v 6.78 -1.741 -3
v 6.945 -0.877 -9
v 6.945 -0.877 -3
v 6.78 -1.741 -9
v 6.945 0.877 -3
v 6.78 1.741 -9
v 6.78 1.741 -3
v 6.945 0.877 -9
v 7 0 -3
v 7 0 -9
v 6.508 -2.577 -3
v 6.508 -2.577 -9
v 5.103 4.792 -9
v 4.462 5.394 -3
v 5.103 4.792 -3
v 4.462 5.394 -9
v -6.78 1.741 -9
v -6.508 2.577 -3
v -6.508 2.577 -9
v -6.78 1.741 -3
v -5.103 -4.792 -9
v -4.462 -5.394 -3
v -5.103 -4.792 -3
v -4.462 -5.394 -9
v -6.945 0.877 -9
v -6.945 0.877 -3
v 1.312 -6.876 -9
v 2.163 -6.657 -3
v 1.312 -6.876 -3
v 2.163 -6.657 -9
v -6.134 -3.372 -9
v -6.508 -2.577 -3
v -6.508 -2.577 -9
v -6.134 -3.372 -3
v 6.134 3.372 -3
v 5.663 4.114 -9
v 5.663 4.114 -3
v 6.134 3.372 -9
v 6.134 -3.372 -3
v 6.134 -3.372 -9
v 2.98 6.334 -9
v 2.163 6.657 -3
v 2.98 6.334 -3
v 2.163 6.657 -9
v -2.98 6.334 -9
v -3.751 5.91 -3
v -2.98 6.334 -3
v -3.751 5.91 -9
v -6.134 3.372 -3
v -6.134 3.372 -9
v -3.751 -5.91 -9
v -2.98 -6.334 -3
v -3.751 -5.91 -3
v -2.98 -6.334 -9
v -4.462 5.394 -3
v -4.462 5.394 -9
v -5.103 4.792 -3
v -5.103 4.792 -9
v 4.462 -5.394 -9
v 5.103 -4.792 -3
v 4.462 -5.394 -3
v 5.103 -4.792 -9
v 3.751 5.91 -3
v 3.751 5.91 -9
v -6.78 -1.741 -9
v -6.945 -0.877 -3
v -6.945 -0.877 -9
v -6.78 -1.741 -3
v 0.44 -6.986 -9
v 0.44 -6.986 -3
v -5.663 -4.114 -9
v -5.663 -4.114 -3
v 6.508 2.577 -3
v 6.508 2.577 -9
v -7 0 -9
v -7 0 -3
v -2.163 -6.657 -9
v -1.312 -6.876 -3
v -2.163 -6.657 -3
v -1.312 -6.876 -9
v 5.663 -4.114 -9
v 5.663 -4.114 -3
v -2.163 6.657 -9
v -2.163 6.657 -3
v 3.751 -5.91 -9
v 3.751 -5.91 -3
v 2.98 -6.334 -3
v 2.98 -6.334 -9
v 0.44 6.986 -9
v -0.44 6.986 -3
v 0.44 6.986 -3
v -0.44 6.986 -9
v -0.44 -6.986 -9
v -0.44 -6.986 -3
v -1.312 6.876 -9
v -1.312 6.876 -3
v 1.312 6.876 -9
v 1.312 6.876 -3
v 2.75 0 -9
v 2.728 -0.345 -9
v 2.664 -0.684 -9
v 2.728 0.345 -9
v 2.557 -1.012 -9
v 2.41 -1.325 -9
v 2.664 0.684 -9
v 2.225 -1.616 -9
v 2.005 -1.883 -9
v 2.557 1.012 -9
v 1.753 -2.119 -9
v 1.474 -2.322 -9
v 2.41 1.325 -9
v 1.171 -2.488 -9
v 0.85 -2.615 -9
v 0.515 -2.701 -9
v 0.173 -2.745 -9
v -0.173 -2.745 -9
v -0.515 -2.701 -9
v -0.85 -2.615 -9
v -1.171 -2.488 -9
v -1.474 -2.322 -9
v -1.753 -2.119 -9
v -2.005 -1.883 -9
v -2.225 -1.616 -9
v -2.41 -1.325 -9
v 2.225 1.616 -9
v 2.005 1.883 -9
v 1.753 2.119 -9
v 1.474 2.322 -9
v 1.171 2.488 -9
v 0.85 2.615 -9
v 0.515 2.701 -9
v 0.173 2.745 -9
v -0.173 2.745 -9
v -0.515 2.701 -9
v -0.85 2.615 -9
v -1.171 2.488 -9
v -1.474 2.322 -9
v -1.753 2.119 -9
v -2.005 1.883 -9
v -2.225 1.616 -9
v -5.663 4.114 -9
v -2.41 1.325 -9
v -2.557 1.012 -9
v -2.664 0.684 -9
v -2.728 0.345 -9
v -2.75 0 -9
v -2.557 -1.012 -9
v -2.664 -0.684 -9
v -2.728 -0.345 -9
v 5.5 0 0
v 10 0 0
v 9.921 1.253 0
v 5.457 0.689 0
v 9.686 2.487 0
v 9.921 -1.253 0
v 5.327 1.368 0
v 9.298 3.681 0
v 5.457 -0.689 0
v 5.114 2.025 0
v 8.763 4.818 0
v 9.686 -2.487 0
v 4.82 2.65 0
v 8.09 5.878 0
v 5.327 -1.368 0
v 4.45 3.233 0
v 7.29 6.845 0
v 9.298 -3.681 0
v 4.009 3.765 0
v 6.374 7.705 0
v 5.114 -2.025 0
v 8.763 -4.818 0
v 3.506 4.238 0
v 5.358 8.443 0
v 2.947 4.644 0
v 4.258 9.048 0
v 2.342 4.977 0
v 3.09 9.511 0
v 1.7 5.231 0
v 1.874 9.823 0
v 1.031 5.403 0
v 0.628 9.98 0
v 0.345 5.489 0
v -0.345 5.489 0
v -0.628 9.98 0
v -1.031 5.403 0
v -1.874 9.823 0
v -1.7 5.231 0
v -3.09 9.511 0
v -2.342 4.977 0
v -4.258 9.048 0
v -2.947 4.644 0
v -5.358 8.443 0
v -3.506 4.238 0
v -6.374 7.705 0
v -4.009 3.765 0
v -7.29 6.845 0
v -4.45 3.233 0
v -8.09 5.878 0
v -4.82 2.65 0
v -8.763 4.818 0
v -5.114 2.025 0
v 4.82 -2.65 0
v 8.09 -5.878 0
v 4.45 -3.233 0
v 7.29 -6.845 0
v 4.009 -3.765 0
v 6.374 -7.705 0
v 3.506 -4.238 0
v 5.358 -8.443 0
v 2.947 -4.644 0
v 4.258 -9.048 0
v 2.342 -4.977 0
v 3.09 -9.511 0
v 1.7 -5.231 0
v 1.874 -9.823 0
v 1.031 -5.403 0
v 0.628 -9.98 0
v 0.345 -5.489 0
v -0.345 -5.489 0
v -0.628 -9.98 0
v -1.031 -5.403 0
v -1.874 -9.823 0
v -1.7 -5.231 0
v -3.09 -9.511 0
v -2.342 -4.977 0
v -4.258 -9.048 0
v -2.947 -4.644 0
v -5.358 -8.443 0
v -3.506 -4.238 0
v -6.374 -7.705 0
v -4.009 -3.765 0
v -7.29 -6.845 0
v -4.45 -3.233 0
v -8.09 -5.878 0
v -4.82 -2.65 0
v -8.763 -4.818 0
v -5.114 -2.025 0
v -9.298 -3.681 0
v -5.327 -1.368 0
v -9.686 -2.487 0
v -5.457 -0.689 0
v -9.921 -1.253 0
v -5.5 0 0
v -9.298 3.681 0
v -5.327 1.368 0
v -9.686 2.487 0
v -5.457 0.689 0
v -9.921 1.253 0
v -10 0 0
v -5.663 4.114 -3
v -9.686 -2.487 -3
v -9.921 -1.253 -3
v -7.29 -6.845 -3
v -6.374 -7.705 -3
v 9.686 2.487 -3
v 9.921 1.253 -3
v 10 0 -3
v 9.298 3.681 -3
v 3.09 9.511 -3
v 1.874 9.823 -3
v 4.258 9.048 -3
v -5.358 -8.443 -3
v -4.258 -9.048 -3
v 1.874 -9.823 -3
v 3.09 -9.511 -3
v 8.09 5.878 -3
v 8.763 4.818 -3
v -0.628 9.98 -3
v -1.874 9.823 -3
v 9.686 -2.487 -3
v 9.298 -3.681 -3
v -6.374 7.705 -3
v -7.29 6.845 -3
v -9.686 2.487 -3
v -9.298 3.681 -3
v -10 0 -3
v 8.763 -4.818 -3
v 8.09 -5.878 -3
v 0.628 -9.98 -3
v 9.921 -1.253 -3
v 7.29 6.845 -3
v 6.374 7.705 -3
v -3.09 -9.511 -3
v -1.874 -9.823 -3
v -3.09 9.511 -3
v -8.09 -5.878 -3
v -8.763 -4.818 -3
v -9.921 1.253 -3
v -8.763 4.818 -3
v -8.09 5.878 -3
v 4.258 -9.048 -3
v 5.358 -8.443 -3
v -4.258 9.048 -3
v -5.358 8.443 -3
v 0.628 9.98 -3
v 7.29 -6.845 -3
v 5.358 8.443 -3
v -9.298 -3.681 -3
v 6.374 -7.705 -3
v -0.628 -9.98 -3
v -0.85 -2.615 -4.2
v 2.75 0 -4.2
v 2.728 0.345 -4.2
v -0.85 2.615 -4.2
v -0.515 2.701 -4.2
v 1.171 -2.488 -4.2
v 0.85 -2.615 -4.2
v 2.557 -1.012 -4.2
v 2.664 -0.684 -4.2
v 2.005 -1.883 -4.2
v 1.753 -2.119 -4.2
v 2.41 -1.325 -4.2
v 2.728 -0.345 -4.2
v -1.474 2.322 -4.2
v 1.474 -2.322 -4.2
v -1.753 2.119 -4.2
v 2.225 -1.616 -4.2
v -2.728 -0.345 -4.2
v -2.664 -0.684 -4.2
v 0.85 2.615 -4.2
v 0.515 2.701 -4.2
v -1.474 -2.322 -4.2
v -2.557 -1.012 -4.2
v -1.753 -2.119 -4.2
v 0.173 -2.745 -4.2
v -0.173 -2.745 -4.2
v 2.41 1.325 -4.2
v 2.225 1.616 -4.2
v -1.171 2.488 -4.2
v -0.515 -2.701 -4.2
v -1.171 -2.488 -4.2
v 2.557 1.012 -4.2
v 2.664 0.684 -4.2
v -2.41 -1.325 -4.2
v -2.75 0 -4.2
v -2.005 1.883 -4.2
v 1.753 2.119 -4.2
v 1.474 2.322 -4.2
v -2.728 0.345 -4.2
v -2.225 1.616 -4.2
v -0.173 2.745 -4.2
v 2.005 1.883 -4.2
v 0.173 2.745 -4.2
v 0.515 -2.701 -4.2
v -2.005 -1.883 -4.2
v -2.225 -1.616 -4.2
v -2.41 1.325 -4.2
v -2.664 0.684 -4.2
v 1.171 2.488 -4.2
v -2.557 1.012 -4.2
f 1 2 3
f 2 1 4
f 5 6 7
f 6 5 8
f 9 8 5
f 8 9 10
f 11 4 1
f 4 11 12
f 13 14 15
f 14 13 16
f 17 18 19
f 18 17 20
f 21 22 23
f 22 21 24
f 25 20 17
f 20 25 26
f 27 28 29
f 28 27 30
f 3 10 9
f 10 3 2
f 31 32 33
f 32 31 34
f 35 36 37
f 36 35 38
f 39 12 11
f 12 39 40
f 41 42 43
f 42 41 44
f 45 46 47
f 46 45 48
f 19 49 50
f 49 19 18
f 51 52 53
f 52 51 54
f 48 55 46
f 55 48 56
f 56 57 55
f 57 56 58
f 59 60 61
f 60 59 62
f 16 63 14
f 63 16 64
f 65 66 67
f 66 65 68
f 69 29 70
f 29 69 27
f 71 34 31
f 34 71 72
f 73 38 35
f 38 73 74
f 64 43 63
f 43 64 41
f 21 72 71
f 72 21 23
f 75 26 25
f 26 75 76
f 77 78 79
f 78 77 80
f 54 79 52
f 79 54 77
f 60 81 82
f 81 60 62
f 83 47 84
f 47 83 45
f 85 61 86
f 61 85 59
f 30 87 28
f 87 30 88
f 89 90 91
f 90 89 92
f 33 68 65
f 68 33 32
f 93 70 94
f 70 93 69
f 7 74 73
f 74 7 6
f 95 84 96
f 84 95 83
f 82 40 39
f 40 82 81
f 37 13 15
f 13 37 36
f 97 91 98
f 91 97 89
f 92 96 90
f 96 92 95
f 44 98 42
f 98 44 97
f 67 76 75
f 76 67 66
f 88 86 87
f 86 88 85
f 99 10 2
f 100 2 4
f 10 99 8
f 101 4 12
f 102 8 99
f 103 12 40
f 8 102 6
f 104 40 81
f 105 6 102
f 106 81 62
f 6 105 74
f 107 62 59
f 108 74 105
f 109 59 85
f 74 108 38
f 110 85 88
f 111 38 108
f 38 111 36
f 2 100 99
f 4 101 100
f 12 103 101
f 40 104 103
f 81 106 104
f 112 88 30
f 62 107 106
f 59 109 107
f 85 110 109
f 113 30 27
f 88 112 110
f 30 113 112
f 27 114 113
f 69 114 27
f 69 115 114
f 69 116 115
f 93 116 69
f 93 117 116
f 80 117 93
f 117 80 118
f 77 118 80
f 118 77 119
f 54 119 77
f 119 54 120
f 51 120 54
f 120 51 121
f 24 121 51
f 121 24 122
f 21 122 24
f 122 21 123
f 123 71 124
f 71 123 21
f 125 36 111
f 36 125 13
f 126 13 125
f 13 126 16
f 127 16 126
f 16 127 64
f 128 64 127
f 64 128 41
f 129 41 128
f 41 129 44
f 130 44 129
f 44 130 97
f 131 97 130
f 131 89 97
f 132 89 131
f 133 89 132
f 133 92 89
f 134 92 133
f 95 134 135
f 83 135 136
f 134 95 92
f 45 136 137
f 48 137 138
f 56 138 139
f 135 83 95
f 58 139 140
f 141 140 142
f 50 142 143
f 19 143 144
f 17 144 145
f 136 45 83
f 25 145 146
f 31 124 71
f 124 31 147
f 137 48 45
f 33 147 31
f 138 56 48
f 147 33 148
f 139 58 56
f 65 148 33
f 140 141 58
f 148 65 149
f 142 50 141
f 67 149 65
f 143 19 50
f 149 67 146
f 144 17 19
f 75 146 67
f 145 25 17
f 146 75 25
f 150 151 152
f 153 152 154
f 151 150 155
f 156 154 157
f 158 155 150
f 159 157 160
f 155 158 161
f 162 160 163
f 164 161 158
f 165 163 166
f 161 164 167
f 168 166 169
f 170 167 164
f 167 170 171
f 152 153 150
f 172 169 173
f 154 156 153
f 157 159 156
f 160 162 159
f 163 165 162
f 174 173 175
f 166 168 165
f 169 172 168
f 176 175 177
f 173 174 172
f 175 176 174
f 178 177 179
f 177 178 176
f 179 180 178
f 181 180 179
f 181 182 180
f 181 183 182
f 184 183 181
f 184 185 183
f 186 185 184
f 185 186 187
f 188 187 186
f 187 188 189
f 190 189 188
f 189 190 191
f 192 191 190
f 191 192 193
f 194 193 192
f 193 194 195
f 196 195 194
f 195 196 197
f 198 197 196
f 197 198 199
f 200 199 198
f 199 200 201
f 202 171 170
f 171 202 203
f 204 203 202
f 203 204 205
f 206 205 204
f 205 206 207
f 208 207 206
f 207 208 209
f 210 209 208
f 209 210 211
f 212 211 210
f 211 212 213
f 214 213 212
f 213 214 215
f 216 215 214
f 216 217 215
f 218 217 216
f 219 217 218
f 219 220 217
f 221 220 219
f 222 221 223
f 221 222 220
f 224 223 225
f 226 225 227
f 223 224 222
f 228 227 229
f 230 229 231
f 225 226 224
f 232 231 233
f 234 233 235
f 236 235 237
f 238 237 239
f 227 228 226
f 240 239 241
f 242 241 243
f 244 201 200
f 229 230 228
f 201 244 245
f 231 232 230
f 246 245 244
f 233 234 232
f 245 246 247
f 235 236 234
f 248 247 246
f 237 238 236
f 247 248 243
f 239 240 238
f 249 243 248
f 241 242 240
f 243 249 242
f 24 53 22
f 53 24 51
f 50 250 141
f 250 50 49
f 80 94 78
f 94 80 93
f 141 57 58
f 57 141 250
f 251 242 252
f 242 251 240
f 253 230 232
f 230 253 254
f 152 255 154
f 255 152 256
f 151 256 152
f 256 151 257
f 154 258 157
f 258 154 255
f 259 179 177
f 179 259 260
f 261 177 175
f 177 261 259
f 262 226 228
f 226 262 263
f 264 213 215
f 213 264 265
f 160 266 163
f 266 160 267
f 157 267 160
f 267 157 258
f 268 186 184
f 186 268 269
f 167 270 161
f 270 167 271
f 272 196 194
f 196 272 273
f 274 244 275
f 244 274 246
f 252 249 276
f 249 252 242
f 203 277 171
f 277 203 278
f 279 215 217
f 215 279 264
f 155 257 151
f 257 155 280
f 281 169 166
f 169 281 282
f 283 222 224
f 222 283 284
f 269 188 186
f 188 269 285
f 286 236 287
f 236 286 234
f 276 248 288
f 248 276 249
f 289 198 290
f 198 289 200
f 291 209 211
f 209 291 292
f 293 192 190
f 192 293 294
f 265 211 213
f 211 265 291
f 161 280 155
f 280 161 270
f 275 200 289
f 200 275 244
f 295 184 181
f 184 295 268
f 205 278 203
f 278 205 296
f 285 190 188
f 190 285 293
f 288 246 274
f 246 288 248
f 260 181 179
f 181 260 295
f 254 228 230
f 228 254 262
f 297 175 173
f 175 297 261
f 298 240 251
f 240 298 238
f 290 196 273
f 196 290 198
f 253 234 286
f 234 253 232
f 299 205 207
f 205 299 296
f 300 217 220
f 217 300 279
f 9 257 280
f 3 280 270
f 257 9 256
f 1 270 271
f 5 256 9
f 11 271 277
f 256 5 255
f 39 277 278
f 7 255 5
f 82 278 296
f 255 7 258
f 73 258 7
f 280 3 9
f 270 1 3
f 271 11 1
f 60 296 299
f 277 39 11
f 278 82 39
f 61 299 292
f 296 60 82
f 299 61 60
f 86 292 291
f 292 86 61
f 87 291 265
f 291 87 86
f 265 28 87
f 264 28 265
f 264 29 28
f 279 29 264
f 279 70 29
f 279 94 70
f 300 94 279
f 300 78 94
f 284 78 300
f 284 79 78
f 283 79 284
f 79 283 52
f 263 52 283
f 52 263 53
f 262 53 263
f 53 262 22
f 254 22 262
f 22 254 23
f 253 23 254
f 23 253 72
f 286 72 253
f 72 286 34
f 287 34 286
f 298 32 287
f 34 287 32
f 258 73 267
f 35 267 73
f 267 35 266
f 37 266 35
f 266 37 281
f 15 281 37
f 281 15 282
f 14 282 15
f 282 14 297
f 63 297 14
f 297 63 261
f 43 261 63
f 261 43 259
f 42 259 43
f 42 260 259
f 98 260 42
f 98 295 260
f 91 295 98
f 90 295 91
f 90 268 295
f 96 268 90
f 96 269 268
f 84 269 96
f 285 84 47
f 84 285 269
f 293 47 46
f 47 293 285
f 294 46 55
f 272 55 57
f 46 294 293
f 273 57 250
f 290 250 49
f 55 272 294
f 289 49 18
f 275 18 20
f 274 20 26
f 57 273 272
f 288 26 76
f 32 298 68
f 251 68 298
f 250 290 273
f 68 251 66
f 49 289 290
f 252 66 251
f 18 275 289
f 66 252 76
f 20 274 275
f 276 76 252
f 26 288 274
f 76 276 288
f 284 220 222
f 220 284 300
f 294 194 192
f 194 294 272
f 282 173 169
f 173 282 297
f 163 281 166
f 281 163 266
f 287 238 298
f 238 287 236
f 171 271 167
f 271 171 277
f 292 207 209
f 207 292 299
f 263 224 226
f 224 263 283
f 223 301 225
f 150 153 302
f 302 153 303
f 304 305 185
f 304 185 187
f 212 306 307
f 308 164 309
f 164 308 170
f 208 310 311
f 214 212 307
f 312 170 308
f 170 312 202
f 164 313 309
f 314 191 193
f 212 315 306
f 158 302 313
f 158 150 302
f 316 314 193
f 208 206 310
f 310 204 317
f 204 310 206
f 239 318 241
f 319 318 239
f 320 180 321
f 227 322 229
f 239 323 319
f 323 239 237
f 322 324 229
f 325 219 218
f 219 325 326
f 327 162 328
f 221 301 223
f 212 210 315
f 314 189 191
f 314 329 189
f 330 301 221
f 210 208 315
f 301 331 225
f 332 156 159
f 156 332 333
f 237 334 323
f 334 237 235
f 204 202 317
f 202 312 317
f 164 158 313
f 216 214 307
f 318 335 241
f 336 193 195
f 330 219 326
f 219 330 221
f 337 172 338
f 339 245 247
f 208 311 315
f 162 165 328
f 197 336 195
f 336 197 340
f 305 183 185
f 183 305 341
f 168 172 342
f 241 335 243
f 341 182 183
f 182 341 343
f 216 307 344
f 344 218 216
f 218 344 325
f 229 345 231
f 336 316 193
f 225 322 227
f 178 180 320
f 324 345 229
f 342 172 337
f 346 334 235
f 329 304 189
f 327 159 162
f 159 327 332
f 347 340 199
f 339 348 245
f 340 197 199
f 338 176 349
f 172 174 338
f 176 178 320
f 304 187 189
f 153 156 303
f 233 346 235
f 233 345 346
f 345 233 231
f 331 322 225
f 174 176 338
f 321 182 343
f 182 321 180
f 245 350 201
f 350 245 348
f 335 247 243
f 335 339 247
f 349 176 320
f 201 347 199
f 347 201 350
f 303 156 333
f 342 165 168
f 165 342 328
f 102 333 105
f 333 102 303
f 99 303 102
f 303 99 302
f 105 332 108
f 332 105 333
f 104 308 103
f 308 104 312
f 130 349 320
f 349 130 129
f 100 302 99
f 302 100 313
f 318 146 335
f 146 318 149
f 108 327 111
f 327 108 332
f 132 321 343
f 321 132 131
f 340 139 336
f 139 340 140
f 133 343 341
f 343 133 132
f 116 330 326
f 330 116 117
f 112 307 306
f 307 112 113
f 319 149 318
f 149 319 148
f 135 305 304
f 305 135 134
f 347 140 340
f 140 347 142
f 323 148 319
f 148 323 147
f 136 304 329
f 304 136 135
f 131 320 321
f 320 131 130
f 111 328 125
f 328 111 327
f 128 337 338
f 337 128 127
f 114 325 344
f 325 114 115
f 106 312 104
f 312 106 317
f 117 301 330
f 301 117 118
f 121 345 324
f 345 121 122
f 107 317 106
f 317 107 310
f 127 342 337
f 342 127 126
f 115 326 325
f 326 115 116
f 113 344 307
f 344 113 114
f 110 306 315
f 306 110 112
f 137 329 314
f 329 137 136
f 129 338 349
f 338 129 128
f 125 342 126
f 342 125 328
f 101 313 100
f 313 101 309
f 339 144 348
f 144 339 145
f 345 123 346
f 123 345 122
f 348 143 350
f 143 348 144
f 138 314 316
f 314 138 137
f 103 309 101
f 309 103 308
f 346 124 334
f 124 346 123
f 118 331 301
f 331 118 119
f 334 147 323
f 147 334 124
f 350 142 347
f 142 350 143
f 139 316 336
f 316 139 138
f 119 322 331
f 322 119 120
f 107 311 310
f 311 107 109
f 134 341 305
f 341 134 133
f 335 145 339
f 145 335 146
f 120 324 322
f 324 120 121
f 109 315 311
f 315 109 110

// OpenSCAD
$fn = 50;


difference() {
	union() {
		translate(v = [0, 0, -9.0000000000]) {
			cylinder(h = 9, r = 7.0000000000);
		}
		translate(v = [0, 0, -3.0000000000]) {
			cylinder(h = 3, r = 10.0000000000);
		}
	}
	union() {
		translate(v = [0, 0, 0]) {
			rotate(a = [0, 0, 0]) {
				difference() {
					union() {
						#translate(v = [0, 0, -9.0000000000]) {
							cylinder(h = 9, r = 2.2500000000);
						}
						#translate(v = [0, 0, -4.2000000000]) {
							cylinder(h = 4.2000000000, r1 = 2.7500000000, r2 = 5.5000000000);
						}
						#translate(v = [0, 0, -9.0000000000]) {
							cylinder(h = 9, r = 2.7500000000);
						}
						#translate(v = [0, 0, -9.0000000000]) {
							cylinder(h = 9, r = 2.2500000000);
						}
					}
					union();
				}
			}
		}
	}
}
